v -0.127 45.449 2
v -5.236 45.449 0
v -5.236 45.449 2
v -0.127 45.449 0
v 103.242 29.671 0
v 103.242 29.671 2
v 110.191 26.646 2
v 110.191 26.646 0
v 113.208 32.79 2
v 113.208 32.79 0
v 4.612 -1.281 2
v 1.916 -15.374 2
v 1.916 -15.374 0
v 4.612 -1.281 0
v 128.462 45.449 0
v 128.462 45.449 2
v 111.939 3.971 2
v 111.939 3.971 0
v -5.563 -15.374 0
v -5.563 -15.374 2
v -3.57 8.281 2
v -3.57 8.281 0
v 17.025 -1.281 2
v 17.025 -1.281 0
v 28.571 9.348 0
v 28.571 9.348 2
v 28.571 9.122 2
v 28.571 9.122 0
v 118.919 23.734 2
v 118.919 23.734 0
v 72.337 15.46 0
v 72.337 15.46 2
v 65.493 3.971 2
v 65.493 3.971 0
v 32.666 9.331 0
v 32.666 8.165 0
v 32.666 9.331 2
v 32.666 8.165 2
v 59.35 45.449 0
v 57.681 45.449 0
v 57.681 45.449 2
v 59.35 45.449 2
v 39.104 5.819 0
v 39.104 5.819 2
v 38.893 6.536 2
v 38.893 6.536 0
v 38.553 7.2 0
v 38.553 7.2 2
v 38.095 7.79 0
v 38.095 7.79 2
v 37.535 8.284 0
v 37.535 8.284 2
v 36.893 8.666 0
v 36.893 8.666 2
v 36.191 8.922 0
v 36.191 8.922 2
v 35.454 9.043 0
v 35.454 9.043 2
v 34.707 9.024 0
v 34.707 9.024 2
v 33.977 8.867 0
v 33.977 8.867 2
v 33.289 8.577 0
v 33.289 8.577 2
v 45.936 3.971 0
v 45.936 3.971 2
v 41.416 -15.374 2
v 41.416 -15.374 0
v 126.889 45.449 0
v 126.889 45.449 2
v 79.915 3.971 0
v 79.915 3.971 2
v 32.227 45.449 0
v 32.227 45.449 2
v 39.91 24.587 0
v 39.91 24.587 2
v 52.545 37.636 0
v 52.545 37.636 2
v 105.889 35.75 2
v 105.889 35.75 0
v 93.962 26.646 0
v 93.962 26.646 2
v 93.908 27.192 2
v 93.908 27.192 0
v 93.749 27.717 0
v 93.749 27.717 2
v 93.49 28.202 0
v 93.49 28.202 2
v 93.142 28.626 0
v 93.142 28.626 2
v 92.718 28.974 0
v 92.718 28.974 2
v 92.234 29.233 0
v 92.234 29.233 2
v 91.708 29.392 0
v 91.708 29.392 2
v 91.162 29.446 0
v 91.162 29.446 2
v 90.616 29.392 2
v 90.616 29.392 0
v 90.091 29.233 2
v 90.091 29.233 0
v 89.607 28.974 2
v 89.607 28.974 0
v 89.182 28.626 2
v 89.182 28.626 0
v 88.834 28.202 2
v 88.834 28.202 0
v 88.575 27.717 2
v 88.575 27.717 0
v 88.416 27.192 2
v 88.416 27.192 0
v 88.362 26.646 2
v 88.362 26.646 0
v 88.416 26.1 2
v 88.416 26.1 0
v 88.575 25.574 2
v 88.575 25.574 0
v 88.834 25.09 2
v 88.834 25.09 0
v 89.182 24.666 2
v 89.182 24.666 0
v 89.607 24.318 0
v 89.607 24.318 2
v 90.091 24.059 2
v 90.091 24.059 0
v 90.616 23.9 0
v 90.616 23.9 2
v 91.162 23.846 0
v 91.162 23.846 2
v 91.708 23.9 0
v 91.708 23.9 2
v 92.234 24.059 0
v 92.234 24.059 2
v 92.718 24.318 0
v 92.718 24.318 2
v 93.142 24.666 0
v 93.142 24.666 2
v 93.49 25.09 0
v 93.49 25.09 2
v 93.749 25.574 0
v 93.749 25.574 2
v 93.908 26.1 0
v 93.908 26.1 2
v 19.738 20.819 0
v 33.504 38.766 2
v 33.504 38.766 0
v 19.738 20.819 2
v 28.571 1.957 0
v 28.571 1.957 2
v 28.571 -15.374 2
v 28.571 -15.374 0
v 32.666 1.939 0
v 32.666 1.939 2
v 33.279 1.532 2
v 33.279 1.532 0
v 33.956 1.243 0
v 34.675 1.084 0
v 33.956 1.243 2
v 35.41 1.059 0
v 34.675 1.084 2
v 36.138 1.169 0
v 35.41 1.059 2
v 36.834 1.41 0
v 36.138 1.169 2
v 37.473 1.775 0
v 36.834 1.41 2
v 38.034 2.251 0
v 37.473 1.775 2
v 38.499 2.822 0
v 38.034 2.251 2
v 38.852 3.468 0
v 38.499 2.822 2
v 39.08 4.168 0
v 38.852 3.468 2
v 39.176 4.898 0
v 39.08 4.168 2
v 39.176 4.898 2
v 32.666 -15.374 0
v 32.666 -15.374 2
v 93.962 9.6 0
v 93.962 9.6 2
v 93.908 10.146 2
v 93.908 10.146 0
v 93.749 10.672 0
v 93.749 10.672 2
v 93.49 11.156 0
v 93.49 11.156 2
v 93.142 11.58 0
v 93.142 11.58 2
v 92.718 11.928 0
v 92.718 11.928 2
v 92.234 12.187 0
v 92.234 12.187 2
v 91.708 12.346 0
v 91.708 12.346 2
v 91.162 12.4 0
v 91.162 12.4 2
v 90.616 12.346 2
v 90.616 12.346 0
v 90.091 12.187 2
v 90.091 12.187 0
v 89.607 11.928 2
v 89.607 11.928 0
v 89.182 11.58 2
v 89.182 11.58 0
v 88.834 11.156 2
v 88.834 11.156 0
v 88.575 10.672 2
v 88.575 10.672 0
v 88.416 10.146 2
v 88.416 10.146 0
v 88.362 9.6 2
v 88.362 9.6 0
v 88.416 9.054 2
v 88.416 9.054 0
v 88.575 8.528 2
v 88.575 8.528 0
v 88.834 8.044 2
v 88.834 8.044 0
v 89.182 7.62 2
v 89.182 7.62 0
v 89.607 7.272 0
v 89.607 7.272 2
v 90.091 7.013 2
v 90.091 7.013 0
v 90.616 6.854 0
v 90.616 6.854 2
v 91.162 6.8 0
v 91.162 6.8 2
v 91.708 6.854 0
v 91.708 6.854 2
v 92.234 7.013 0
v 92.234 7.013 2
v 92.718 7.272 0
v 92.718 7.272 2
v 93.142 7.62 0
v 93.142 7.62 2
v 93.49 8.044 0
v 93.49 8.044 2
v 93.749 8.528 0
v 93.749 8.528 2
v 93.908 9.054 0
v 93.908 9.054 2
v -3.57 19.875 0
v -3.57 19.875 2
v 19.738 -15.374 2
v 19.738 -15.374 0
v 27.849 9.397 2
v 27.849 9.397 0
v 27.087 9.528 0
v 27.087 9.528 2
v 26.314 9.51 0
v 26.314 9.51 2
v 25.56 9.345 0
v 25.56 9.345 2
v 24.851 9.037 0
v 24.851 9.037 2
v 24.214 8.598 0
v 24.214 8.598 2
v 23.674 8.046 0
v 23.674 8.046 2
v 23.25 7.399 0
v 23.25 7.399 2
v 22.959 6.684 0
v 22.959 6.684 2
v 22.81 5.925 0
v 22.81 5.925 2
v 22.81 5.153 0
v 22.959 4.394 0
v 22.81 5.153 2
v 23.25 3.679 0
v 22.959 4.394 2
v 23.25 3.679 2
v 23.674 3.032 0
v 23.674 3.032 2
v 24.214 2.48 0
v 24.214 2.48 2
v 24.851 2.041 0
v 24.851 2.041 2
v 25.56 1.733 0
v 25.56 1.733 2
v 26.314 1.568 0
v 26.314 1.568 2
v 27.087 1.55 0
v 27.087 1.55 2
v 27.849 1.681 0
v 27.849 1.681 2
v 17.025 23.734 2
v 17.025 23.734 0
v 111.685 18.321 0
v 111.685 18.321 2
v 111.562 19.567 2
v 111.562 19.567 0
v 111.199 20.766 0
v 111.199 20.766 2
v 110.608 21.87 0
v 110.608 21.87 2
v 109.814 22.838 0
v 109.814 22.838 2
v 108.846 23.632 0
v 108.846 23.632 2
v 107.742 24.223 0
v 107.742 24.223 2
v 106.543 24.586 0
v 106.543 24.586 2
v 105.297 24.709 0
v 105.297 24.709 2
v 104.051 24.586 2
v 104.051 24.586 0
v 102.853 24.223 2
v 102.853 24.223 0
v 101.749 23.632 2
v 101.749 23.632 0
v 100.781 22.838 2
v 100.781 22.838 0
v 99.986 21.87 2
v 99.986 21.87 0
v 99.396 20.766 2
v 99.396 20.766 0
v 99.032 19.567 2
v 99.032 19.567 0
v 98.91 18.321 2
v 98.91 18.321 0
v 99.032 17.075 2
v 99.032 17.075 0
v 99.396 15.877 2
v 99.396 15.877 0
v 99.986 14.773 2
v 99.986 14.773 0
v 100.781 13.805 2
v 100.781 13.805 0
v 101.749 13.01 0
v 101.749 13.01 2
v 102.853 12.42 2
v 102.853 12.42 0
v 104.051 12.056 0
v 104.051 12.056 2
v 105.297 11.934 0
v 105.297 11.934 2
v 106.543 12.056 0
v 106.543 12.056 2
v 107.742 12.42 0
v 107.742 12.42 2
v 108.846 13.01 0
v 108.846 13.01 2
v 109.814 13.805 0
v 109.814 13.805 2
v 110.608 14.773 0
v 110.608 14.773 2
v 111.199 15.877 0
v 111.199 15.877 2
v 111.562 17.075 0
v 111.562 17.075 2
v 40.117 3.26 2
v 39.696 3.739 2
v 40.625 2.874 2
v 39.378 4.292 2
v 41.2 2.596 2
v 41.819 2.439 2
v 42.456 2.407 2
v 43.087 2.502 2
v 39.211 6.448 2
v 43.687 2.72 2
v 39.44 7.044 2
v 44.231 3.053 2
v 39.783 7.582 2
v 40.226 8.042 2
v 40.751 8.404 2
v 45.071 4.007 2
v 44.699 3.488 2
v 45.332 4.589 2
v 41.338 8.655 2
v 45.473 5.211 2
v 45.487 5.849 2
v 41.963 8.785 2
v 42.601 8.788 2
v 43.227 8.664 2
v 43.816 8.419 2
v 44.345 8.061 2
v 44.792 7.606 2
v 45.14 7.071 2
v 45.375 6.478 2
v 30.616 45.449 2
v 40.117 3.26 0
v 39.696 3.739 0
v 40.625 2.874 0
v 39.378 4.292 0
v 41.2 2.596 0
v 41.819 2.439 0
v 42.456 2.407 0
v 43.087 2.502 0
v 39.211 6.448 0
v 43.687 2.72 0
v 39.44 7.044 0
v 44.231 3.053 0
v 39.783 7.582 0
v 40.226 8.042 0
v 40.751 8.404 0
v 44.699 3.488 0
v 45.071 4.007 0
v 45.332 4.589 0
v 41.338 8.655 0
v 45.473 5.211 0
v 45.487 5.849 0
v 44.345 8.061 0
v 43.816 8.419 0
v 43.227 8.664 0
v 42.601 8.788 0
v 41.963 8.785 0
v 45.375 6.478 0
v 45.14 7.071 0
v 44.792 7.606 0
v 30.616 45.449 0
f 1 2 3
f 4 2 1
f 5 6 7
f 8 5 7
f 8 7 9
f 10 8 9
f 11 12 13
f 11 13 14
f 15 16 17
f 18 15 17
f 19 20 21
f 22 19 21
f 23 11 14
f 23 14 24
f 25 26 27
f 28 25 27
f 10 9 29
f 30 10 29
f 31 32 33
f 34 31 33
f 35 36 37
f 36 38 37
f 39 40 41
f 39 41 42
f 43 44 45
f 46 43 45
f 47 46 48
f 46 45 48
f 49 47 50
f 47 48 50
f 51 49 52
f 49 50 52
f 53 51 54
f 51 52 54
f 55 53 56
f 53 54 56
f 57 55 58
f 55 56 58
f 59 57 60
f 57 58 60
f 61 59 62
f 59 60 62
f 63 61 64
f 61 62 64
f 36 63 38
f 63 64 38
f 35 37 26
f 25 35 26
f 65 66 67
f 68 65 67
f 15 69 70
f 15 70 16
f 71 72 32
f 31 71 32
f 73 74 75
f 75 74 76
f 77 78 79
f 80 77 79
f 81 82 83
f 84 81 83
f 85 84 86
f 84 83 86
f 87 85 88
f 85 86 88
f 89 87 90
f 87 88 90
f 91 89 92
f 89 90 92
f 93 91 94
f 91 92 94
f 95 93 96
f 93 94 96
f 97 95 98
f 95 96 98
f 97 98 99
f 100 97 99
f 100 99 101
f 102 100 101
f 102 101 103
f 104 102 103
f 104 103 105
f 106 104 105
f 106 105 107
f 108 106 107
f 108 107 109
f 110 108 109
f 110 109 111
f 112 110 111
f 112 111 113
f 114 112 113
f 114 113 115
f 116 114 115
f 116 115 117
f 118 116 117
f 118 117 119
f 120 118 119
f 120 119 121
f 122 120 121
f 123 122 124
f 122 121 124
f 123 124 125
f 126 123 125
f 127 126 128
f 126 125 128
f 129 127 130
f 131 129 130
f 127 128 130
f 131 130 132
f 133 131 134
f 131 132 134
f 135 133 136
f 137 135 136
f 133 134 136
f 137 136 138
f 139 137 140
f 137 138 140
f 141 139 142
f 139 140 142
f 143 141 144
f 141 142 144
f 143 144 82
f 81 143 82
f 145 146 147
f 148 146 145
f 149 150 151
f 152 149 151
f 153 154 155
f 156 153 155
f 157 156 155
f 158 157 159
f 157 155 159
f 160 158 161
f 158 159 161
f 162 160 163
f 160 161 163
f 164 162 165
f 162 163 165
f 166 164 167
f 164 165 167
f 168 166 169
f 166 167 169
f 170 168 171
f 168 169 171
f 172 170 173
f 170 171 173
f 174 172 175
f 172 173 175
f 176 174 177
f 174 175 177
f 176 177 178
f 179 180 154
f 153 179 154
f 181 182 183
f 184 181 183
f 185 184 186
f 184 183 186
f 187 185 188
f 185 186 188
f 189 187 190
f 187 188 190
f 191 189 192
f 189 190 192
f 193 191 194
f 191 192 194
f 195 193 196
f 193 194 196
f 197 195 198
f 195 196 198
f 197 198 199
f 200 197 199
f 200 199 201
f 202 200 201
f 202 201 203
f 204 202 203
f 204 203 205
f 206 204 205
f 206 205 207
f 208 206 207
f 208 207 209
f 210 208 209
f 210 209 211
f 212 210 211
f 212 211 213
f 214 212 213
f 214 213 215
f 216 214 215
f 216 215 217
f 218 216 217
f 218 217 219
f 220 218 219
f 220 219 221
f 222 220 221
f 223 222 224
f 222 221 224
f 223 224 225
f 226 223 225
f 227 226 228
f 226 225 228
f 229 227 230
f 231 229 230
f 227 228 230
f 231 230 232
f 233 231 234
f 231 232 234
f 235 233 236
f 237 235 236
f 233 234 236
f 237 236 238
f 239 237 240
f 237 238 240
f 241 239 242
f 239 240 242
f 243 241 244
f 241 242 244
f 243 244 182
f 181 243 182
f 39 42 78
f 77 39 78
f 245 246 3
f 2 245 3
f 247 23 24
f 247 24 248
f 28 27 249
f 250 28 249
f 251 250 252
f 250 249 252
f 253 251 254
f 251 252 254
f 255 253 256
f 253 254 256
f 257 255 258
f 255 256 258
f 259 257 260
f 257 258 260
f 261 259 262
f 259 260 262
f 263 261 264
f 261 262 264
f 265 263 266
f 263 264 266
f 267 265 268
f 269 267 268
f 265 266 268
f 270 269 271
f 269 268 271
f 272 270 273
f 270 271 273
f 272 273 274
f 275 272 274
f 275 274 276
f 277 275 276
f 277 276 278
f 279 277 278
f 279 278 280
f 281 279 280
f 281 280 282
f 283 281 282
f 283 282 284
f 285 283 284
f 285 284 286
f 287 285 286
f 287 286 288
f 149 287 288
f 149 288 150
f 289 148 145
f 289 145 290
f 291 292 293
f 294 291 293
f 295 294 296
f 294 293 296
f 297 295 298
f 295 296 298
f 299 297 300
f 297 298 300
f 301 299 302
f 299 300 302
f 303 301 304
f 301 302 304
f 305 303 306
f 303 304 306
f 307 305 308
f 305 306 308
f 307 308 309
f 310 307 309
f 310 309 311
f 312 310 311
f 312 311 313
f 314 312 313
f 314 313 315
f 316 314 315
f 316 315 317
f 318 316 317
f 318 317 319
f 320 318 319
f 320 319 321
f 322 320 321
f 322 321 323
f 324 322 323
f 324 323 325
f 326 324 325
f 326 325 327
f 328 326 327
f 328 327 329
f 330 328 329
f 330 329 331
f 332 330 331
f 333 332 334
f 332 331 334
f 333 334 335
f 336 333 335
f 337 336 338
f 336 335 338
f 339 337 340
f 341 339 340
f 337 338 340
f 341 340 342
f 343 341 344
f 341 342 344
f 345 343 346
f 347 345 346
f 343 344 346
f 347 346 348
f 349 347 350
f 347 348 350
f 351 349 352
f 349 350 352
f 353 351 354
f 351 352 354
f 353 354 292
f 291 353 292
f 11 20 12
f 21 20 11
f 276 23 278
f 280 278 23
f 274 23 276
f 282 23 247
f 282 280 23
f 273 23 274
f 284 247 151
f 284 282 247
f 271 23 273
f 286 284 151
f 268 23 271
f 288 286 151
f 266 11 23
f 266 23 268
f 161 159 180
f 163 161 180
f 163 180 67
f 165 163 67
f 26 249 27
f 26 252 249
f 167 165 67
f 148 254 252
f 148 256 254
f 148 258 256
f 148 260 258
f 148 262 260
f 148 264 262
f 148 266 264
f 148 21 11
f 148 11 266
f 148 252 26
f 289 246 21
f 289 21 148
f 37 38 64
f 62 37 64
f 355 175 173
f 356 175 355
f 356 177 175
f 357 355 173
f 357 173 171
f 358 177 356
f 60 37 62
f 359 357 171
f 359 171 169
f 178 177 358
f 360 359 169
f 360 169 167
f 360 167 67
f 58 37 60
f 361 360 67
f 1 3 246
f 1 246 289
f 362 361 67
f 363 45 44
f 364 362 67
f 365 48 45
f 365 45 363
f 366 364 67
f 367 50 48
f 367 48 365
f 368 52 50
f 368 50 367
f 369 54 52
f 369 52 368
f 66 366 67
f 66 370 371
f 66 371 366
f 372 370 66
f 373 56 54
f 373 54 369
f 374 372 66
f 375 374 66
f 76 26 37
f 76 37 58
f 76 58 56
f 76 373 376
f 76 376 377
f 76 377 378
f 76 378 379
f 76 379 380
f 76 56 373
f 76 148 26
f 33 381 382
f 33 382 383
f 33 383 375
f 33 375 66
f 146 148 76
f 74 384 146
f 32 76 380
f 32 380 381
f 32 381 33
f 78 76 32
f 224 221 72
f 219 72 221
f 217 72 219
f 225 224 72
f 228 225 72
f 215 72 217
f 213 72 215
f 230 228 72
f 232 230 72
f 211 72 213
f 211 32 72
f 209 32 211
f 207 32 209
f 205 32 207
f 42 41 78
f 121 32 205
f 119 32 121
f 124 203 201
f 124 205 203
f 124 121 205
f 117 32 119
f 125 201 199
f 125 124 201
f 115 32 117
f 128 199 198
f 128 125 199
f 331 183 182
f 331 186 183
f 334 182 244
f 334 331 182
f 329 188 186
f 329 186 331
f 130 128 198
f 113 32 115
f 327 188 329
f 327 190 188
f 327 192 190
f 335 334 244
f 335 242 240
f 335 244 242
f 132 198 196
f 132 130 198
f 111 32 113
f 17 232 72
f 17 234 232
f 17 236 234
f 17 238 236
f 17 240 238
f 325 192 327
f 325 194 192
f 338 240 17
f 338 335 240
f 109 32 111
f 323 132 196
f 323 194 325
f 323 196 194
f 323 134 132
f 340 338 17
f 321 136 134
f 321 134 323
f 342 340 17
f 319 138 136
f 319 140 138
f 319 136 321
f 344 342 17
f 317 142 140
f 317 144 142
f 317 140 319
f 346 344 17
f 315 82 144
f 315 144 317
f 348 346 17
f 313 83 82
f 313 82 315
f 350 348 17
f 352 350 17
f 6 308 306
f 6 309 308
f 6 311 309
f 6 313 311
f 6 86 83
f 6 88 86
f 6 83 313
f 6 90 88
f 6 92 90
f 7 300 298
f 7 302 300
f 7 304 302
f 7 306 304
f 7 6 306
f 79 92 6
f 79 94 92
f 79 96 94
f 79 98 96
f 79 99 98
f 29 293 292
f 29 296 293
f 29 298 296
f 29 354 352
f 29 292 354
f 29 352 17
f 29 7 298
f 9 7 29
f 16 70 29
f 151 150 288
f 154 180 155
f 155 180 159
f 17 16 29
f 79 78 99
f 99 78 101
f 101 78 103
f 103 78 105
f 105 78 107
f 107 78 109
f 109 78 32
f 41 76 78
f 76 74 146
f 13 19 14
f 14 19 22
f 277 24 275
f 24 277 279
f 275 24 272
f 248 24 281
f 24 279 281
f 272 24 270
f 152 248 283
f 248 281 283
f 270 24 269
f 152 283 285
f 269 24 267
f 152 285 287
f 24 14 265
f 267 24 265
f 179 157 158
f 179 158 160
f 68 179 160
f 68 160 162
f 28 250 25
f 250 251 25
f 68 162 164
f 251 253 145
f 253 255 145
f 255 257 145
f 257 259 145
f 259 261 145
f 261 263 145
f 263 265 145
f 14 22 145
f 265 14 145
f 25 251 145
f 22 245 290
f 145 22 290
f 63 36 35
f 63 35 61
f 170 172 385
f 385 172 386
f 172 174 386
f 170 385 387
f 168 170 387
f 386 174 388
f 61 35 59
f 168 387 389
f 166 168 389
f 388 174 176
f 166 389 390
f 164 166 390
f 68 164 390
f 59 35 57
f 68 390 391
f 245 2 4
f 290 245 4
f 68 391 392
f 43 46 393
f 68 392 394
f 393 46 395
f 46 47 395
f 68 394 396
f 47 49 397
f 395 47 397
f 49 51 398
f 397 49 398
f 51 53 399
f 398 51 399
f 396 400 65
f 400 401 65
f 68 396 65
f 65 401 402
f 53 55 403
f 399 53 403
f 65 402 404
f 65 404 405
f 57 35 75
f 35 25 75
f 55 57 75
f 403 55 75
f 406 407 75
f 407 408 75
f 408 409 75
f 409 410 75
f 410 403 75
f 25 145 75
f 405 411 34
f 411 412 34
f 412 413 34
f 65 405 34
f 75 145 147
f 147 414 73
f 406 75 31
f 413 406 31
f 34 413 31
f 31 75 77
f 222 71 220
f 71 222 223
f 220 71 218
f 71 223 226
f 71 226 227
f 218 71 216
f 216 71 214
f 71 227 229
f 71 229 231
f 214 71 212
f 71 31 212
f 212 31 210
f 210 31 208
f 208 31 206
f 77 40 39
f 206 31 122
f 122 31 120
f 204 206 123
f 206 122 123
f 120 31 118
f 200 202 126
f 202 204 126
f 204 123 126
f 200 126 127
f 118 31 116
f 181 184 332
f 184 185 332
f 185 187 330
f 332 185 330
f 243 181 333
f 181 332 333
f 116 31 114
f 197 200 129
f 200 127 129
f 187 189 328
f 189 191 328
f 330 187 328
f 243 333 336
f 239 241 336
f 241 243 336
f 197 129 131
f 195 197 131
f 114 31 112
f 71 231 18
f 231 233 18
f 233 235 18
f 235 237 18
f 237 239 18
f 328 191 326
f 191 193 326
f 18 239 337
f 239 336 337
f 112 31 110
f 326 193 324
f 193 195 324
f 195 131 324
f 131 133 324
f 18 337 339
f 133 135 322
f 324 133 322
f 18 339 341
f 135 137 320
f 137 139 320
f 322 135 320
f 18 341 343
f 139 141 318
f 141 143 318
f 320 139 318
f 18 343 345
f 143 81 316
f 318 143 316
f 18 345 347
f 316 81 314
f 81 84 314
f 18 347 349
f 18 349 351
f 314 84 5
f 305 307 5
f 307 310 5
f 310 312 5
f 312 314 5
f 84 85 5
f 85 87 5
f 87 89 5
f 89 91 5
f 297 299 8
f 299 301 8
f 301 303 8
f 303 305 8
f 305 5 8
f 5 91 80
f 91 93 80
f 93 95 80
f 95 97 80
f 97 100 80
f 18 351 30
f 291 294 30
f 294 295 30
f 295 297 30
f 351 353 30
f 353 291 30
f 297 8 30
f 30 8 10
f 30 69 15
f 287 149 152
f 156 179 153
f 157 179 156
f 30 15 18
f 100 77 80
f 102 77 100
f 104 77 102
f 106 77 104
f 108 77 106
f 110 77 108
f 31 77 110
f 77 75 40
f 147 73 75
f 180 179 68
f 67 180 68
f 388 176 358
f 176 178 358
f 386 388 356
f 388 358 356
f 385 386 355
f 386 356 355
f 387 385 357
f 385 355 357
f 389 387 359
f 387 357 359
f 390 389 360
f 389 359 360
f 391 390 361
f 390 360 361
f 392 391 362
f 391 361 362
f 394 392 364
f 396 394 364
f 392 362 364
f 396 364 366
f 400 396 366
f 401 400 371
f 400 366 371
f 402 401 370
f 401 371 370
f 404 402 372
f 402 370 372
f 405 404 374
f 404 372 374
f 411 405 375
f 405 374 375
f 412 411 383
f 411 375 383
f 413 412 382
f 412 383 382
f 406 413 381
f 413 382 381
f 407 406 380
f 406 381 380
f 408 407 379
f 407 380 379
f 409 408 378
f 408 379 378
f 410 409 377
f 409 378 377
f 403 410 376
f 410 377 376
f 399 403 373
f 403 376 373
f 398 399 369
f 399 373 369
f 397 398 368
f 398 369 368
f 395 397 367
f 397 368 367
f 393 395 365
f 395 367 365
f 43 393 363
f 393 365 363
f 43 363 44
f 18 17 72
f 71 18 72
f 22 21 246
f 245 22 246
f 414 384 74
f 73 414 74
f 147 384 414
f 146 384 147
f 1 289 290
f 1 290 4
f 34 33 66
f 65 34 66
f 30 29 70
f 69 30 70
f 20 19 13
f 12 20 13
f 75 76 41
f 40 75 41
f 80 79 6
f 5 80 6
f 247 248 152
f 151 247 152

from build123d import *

# Parameters (mm, degrees)
SKETCH_1_W          = 174.091607372
SKETCH_1_H          = 60.823122747
EXTRUDE_1_DEPTH     = 2
SKETCH_2_R          = 6.75
SKETCH_2_R_2        = 4
SKETCH_2_R_3        = 6.387609309
CUT_EXTRUDE_2_DEPTH = 3
SKETCH_5_R          = 2.8
SKETCH_5_R_2        = 3.2
CUT_EXTRUDE_6_DEPTH = 3


with BuildPart() as part:
    # Эскиз1 → Бобышка-Вытянуть1 (new body)
    with BuildSketch(Plane.XY):
        with Locations((41.416369032, 15.037436288)):
            Rectangle(SKETCH_1_W, SKETCH_1_H)
    extrude(amount=EXTRUDE_1_DEPTH)

    # Эскиз2 → Вырез-Вытянуть2 (cut, through all)
    with BuildSketch(Plane.XY.offset(2)):
        with Locations((-19.785334363, 17.425924278)):
            Circle(SKETCH_2_R)
        with Locations((26.791510955, 5.539037957)):
            Circle(SKETCH_2_R_2)
        with Locations((35.178515275, 5.052050609)):
            Circle(SKETCH_2_R_2)
        with Locations((105.297300125, 18.321325083)):
            Circle(SKETCH_2_R_3)
    extrude(amount=-CUT_EXTRUDE_2_DEPTH, mode=Mode.SUBTRACT)

    # Эскиз5 → Вырез-Вытянуть6 (cut, through all)
    with BuildSketch(Plane.XY.offset(2)):
        with Locations((91.162128274, 26.645923824)):
            Circle(SKETCH_5_R)
        with Locations((91.162128274, 9.6)):
            Circle(SKETCH_5_R)
        with Locations((42.296935023, 5.602595819)):
            Circle(SKETCH_5_R_2)
        Polygon((28.570706192, 9.34764981), (28.570706192, -16.12332621), (32.666265218, -16.12332621), (32.666265218, 9.330532976), align=None)
        Polygon((33.503712587, 38.765606149), (19.738187242, 20.818838125), (17.024936958, 23.734062815), (-4.96394501, 51.572688279), (27.970840429, 51.572688279), align=None)
        Polygon((31.662167761, 46.983470514), (39.910203219, 24.587362026), (58.988646835, 46.983470514), align=None)
        Polygon((4.611696012, -1.281488831), (17.024936958, -1.281488831), (19.738187242, -15.374125086), (1.915533217, -15.374125086), align=None)
        Polygon((-5.563318521, -15.374125086), (-3.57038705, 8.280770389), (-3.57038705, 19.874672628), (-5.563318521, 50.475189584), (-48.013678964, 50.475189584), (-48.013678964, -15.374125086), align=None)
        Polygon((72.33728383, 15.460155755), (65.492559947, 3.970797808), (45.936205994, 3.970797808), (41.416369032, -15.374125086), (128.462172718, -15.374125086), (128.462172718, 45.448997661), (111.938900584, 3.970797808), (79.915370987, 3.970797808), align=None)
        Polygon((61.092380308, 47.449740359), (52.544642812, 37.635973837), (105.888722073, 35.749872981), (103.242302386, 29.670868316), (110.190804078, 26.645923824), (113.207690043, 32.789853089), (118.919189497, 23.734062815), (126.889373288, 45.448997661), align=None)
    extrude(amount=-CUT_EXTRUDE_6_DEPTH, mode=Mode.SUBTRACT)


solid = part.part
